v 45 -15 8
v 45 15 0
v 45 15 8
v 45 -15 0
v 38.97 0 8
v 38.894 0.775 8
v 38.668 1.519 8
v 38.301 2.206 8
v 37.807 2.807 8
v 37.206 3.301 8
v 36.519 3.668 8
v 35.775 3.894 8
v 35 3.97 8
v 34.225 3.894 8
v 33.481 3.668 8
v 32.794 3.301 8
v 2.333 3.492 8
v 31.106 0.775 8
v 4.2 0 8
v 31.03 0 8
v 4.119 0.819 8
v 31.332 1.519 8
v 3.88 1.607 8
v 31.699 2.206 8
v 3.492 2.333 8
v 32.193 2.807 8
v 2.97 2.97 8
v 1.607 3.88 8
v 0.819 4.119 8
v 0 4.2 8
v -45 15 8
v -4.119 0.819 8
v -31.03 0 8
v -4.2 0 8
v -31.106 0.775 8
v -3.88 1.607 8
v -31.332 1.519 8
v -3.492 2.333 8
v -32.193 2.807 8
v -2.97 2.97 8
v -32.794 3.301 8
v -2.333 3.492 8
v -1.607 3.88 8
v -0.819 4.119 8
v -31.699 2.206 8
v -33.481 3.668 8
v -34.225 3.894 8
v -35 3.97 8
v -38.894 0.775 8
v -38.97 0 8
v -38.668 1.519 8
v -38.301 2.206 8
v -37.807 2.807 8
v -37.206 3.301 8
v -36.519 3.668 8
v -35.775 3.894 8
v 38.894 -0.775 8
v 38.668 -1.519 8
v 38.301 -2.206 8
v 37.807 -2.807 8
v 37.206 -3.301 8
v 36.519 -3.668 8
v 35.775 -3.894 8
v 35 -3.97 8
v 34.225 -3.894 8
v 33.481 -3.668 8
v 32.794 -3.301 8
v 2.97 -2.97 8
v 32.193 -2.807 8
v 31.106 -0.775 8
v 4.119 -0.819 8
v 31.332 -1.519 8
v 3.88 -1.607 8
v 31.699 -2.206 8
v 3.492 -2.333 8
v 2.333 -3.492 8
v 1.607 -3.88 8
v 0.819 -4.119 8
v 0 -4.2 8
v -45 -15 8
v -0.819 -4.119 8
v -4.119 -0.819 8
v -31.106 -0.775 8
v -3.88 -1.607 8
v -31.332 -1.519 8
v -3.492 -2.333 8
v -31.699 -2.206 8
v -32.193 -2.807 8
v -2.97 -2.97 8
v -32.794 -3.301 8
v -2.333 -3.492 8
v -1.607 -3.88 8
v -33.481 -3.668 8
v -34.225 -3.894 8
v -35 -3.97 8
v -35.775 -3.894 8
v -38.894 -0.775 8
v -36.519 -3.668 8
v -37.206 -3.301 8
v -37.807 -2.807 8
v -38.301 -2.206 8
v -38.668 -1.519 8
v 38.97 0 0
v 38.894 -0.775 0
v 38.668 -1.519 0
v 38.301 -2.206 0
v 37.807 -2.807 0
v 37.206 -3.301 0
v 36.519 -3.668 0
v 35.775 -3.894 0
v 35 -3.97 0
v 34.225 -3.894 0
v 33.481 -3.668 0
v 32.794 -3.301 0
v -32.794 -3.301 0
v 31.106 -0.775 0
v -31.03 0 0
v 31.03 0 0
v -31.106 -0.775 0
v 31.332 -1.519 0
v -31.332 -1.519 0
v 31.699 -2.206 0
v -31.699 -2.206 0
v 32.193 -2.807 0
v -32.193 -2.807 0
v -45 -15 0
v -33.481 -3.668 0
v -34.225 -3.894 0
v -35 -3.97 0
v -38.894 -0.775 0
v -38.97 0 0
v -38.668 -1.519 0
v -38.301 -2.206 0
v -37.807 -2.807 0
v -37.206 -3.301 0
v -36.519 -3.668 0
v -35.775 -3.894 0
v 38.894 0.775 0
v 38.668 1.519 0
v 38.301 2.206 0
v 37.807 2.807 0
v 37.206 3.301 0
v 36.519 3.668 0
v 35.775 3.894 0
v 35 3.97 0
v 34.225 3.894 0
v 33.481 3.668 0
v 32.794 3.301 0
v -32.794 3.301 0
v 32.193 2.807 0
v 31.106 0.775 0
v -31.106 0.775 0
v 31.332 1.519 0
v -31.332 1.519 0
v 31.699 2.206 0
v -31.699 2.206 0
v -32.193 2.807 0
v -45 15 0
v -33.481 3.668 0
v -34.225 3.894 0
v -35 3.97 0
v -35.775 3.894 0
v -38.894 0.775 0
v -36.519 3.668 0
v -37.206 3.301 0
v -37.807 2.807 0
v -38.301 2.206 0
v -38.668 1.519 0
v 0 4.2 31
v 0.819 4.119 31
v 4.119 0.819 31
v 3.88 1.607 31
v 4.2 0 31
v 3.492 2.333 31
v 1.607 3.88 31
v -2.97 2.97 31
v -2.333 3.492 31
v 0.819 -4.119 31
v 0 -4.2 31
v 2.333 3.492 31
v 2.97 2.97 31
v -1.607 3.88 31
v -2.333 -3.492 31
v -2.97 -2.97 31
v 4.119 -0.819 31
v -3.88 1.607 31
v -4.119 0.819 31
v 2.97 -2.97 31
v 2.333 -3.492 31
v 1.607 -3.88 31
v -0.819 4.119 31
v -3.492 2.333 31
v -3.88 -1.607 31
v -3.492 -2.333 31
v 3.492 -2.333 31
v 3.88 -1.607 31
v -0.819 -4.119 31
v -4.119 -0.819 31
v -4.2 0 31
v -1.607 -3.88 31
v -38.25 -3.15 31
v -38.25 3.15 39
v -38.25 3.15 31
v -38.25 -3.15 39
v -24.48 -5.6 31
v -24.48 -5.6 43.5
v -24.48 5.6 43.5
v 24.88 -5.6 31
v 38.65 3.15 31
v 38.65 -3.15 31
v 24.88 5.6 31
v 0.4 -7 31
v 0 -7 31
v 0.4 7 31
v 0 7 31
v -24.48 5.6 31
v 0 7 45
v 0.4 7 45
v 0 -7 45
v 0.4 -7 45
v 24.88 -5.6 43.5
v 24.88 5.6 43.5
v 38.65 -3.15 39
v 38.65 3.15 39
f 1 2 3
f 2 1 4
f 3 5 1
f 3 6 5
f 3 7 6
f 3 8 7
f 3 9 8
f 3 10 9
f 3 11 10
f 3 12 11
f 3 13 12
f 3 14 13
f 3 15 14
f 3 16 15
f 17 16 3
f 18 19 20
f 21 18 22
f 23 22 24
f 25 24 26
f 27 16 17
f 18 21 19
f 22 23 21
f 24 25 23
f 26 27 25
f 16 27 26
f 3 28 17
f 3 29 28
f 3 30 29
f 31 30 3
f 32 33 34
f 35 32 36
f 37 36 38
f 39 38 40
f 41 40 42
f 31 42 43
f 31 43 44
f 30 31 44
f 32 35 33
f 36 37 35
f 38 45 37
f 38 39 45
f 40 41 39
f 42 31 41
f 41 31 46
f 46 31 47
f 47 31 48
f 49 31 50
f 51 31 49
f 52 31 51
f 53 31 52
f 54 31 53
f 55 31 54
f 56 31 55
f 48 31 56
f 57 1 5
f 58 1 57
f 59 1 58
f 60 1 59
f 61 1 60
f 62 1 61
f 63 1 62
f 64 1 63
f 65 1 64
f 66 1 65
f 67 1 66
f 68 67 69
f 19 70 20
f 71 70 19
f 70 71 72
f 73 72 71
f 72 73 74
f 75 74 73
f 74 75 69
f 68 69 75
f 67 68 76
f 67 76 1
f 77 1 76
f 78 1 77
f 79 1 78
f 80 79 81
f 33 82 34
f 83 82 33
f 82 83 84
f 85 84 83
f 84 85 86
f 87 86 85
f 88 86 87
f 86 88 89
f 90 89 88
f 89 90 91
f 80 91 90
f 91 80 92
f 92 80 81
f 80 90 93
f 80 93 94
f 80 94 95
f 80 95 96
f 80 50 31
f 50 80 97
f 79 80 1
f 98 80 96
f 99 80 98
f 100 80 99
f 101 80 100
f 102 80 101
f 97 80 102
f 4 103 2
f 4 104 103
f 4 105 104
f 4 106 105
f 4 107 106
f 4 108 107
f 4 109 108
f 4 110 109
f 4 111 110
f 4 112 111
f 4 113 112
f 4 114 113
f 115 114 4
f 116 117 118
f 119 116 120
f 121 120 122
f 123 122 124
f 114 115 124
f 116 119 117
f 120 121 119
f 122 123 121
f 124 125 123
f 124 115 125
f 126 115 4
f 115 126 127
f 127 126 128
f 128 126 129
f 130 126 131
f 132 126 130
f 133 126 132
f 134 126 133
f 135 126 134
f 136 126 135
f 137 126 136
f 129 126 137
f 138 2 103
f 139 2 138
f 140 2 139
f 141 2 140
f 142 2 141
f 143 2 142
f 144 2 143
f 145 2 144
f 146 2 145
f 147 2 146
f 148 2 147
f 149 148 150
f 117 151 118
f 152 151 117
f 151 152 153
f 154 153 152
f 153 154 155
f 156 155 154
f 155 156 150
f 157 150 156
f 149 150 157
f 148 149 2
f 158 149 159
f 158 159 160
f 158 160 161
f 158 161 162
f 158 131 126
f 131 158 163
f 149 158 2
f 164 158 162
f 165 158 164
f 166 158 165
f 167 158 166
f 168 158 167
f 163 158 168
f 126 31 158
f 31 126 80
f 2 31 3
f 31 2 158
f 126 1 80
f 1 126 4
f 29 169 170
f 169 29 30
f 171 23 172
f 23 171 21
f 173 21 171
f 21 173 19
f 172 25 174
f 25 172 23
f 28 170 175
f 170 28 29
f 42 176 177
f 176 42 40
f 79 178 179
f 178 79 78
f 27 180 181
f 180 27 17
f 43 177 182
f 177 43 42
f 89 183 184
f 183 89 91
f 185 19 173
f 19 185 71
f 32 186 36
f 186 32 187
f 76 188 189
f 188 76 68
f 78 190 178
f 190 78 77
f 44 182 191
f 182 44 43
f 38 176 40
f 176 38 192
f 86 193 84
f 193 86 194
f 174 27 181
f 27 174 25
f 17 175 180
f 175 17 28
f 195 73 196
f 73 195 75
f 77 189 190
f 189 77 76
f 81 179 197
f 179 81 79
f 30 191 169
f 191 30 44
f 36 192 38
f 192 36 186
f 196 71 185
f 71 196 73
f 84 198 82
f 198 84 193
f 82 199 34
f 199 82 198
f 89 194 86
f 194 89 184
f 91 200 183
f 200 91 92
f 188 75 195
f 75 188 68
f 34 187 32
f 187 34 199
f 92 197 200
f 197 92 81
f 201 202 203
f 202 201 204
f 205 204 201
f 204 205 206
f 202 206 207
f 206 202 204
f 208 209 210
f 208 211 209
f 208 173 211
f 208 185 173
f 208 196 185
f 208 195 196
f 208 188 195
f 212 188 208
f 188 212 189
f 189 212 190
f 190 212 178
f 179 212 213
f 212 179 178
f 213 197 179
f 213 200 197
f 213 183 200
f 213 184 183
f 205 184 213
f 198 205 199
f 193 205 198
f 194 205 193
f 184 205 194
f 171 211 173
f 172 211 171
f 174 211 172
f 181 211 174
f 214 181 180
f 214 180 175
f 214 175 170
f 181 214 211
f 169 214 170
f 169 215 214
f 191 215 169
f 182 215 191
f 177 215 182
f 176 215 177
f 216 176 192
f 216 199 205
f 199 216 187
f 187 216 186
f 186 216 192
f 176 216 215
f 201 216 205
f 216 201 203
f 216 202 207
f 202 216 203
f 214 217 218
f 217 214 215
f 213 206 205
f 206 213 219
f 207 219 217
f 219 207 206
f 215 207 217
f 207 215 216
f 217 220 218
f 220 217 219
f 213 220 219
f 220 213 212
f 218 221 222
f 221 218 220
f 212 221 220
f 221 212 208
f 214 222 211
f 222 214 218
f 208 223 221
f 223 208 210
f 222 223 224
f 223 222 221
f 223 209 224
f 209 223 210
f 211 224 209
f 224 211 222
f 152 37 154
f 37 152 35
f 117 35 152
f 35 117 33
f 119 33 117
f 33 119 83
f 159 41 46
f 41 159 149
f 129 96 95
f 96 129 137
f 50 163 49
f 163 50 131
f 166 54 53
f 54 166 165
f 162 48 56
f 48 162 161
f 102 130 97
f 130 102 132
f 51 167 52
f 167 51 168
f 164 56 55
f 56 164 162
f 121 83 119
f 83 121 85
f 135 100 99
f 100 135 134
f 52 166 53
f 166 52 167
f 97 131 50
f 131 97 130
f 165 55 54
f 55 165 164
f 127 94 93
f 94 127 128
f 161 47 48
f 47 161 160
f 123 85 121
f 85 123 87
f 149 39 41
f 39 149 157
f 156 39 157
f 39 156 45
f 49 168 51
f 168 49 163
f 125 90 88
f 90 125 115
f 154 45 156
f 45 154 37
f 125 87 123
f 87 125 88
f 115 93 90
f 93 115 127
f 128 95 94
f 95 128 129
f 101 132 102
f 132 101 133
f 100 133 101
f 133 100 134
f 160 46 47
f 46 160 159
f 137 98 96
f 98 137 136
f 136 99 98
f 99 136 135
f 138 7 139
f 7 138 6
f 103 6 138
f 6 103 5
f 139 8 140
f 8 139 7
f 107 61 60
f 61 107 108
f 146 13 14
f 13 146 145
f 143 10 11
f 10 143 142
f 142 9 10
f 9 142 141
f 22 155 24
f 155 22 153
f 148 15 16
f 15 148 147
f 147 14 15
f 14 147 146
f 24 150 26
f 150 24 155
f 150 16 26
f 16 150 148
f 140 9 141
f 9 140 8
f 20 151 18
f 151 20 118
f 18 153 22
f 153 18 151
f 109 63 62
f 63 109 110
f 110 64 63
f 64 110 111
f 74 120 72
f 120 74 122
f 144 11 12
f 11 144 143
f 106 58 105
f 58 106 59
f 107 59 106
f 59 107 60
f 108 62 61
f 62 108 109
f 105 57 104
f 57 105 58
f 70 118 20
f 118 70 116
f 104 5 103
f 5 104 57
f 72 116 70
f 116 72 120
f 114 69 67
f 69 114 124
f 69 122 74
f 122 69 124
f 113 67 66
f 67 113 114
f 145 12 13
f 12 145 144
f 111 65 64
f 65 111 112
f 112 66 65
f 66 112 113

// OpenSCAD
$fn = 32;

// ----------------------------------------------------------------------
// Boat cleat: 90 mm base, horn 38 mm up
// ----------------------------------------------------------------------

// --- parameters (mm) ---
base_l = 90;              // base length
base_w = 30;              // base width
base_t = 8;               // base thickness
horn_len = 76.5;          // horn length
horn_d = 14;              // horn diameter at the middle
horn_z = 38;              // horn axis height
end_drop = 6;             // how far the horn tips drop
post_d = 8.4;             // centre post diameter
holes_d = 7.94;           // fixing holes
hole_x = 35;              // fixing hole spacing

difference() {
  union() {
    translate([-45, -15, 0]) cube([base_l, base_w, base_t]);
    /* centre post, sunk 1 mm into the base */
    translate([0, 0, 7]) cylinder(h = 31, d = post_d);
    /* horn: a hull chain of boxes, full in the middle and lighter at the tips */
    hull() {
      translate([-38.25, -3.15, 31]) cube([0.4, 6.3, 8], center = false);
      translate([-24.48, -5.6, 31]) cube([0.4, 11.2, 12.5], center = false);
    }
    hull() {
      translate([-24.48, -5.6, 31]) cube([0.4, 11.2, 12.5], center = false);
      translate([0, -7, 31]) cube([0.4, 14, 14], center = false);
    }
    hull() {
      translate([0, -7, 31]) cube([0.4, 14, 14], center = false);
      translate([24.48, -5.6, 31]) cube([0.4, 11.2, 12.5], center = false);
    }
    hull() {
      translate([24.48, -5.6, 31]) cube([0.4, 11.2, 12.5], center = false);
      translate([38.25, -3.15, 31]) cube([0.4, 6.3, 8], center = false);
    }
  }
  translate([-35, 0, -2.5]) cylinder(h = base_t + 5, d = holes_d);
  translate([35, 0, -2.5]) cylinder(h = base_t + 5, d = holes_d);
}
